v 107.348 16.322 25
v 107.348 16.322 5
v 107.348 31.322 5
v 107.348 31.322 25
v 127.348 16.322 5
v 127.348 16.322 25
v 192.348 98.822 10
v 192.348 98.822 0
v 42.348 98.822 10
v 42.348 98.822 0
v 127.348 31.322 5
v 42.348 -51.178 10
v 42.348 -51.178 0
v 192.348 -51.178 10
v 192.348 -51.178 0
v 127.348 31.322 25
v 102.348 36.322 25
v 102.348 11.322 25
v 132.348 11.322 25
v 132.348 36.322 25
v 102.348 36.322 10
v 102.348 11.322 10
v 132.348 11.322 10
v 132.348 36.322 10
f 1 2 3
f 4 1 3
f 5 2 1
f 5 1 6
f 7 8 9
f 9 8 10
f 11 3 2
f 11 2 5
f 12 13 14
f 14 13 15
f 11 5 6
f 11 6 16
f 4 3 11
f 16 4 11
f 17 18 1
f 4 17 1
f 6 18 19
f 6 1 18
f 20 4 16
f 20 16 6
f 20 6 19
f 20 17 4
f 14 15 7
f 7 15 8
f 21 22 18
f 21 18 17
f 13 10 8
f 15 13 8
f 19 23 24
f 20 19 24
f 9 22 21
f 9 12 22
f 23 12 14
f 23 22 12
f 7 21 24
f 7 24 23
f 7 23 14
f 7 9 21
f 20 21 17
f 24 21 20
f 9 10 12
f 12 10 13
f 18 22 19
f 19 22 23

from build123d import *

# Parameters (mm, degrees)
F1_DEPTH = 10
F2_W     = 30
F2_H     = 25
F2_W_2   = 20
F2_H_2   = 15
F3_DEPTH = 15
F4_DEPTH = 5


with BuildPart() as f1:
    # F0 (on Top) → F1 (new body)
    with BuildSketch(Plane.XY):
        Polygon((109.8478005826, 31.3216452301), (42.3478005826, 98.8216452301), (42.3478005826, -51.1783547699), (109.8478005826, 16.3216452301), (107.3478005826, 16.3216452301), (107.3478005826, 31.3216452301), align=None)
        Polygon((192.3478005826, 98.8216452301), (42.3478005826, 98.8216452301), (109.8478005826, 31.3216452301), (124.8478005826, 31.3216452301), align=None)
        Polygon((192.3478005826, -51.1783547699), (192.3478005826, 98.8216452301), (124.8478005826, 31.3216452301), (127.3478005826, 31.3216452301), (127.3478005826, 16.3216452301), (124.8478005826, 16.3216452301), align=None)
        Polygon((109.8478005826, 16.3216452301), (42.3478005826, -51.1783547699), (192.3478005826, -51.1783547699), (124.8478005826, 16.3216452301), align=None)
    extrude(amount=F1_DEPTH)

    # F2 (on face) → F3 (join)
    with BuildSketch(Plane.XY.offset(10)):
        with Locations((117.3478005826, 23.8216452301)):
            Rectangle(F2_W, F2_H)
        with Locations((117.3478005826, 23.8216452301)):
            Rectangle(F2_W_2, F2_H_2, mode=Mode.SUBTRACT)
    extrude(amount=F3_DEPTH)

    # F0 (on Top) → F4 (join)
    with BuildSketch(Plane.XY):
        Polygon((127.3478005826, 31.3216452301), (124.8478005826, 31.3216452301), (117.3478005826, 23.8216452301), (124.8478005826, 16.3216452301), (127.3478005826, 16.3216452301), align=None)
        Polygon((124.8478005826, 31.3216452301), (109.8478005826, 31.3216452301), (117.3478005826, 23.8216452301), align=None)
        Polygon((117.3478005826, 23.8216452301), (109.8478005826, 31.3216452301), (107.3478005826, 31.3216452301), (107.3478005826, 16.3216452301), (109.8478005826, 16.3216452301), align=None)
        Polygon((117.3478005826, 23.8216452301), (109.8478005826, 16.3216452301), (124.8478005826, 16.3216452301), align=None)
    extrude(amount=F4_DEPTH)


solid = f1.part
